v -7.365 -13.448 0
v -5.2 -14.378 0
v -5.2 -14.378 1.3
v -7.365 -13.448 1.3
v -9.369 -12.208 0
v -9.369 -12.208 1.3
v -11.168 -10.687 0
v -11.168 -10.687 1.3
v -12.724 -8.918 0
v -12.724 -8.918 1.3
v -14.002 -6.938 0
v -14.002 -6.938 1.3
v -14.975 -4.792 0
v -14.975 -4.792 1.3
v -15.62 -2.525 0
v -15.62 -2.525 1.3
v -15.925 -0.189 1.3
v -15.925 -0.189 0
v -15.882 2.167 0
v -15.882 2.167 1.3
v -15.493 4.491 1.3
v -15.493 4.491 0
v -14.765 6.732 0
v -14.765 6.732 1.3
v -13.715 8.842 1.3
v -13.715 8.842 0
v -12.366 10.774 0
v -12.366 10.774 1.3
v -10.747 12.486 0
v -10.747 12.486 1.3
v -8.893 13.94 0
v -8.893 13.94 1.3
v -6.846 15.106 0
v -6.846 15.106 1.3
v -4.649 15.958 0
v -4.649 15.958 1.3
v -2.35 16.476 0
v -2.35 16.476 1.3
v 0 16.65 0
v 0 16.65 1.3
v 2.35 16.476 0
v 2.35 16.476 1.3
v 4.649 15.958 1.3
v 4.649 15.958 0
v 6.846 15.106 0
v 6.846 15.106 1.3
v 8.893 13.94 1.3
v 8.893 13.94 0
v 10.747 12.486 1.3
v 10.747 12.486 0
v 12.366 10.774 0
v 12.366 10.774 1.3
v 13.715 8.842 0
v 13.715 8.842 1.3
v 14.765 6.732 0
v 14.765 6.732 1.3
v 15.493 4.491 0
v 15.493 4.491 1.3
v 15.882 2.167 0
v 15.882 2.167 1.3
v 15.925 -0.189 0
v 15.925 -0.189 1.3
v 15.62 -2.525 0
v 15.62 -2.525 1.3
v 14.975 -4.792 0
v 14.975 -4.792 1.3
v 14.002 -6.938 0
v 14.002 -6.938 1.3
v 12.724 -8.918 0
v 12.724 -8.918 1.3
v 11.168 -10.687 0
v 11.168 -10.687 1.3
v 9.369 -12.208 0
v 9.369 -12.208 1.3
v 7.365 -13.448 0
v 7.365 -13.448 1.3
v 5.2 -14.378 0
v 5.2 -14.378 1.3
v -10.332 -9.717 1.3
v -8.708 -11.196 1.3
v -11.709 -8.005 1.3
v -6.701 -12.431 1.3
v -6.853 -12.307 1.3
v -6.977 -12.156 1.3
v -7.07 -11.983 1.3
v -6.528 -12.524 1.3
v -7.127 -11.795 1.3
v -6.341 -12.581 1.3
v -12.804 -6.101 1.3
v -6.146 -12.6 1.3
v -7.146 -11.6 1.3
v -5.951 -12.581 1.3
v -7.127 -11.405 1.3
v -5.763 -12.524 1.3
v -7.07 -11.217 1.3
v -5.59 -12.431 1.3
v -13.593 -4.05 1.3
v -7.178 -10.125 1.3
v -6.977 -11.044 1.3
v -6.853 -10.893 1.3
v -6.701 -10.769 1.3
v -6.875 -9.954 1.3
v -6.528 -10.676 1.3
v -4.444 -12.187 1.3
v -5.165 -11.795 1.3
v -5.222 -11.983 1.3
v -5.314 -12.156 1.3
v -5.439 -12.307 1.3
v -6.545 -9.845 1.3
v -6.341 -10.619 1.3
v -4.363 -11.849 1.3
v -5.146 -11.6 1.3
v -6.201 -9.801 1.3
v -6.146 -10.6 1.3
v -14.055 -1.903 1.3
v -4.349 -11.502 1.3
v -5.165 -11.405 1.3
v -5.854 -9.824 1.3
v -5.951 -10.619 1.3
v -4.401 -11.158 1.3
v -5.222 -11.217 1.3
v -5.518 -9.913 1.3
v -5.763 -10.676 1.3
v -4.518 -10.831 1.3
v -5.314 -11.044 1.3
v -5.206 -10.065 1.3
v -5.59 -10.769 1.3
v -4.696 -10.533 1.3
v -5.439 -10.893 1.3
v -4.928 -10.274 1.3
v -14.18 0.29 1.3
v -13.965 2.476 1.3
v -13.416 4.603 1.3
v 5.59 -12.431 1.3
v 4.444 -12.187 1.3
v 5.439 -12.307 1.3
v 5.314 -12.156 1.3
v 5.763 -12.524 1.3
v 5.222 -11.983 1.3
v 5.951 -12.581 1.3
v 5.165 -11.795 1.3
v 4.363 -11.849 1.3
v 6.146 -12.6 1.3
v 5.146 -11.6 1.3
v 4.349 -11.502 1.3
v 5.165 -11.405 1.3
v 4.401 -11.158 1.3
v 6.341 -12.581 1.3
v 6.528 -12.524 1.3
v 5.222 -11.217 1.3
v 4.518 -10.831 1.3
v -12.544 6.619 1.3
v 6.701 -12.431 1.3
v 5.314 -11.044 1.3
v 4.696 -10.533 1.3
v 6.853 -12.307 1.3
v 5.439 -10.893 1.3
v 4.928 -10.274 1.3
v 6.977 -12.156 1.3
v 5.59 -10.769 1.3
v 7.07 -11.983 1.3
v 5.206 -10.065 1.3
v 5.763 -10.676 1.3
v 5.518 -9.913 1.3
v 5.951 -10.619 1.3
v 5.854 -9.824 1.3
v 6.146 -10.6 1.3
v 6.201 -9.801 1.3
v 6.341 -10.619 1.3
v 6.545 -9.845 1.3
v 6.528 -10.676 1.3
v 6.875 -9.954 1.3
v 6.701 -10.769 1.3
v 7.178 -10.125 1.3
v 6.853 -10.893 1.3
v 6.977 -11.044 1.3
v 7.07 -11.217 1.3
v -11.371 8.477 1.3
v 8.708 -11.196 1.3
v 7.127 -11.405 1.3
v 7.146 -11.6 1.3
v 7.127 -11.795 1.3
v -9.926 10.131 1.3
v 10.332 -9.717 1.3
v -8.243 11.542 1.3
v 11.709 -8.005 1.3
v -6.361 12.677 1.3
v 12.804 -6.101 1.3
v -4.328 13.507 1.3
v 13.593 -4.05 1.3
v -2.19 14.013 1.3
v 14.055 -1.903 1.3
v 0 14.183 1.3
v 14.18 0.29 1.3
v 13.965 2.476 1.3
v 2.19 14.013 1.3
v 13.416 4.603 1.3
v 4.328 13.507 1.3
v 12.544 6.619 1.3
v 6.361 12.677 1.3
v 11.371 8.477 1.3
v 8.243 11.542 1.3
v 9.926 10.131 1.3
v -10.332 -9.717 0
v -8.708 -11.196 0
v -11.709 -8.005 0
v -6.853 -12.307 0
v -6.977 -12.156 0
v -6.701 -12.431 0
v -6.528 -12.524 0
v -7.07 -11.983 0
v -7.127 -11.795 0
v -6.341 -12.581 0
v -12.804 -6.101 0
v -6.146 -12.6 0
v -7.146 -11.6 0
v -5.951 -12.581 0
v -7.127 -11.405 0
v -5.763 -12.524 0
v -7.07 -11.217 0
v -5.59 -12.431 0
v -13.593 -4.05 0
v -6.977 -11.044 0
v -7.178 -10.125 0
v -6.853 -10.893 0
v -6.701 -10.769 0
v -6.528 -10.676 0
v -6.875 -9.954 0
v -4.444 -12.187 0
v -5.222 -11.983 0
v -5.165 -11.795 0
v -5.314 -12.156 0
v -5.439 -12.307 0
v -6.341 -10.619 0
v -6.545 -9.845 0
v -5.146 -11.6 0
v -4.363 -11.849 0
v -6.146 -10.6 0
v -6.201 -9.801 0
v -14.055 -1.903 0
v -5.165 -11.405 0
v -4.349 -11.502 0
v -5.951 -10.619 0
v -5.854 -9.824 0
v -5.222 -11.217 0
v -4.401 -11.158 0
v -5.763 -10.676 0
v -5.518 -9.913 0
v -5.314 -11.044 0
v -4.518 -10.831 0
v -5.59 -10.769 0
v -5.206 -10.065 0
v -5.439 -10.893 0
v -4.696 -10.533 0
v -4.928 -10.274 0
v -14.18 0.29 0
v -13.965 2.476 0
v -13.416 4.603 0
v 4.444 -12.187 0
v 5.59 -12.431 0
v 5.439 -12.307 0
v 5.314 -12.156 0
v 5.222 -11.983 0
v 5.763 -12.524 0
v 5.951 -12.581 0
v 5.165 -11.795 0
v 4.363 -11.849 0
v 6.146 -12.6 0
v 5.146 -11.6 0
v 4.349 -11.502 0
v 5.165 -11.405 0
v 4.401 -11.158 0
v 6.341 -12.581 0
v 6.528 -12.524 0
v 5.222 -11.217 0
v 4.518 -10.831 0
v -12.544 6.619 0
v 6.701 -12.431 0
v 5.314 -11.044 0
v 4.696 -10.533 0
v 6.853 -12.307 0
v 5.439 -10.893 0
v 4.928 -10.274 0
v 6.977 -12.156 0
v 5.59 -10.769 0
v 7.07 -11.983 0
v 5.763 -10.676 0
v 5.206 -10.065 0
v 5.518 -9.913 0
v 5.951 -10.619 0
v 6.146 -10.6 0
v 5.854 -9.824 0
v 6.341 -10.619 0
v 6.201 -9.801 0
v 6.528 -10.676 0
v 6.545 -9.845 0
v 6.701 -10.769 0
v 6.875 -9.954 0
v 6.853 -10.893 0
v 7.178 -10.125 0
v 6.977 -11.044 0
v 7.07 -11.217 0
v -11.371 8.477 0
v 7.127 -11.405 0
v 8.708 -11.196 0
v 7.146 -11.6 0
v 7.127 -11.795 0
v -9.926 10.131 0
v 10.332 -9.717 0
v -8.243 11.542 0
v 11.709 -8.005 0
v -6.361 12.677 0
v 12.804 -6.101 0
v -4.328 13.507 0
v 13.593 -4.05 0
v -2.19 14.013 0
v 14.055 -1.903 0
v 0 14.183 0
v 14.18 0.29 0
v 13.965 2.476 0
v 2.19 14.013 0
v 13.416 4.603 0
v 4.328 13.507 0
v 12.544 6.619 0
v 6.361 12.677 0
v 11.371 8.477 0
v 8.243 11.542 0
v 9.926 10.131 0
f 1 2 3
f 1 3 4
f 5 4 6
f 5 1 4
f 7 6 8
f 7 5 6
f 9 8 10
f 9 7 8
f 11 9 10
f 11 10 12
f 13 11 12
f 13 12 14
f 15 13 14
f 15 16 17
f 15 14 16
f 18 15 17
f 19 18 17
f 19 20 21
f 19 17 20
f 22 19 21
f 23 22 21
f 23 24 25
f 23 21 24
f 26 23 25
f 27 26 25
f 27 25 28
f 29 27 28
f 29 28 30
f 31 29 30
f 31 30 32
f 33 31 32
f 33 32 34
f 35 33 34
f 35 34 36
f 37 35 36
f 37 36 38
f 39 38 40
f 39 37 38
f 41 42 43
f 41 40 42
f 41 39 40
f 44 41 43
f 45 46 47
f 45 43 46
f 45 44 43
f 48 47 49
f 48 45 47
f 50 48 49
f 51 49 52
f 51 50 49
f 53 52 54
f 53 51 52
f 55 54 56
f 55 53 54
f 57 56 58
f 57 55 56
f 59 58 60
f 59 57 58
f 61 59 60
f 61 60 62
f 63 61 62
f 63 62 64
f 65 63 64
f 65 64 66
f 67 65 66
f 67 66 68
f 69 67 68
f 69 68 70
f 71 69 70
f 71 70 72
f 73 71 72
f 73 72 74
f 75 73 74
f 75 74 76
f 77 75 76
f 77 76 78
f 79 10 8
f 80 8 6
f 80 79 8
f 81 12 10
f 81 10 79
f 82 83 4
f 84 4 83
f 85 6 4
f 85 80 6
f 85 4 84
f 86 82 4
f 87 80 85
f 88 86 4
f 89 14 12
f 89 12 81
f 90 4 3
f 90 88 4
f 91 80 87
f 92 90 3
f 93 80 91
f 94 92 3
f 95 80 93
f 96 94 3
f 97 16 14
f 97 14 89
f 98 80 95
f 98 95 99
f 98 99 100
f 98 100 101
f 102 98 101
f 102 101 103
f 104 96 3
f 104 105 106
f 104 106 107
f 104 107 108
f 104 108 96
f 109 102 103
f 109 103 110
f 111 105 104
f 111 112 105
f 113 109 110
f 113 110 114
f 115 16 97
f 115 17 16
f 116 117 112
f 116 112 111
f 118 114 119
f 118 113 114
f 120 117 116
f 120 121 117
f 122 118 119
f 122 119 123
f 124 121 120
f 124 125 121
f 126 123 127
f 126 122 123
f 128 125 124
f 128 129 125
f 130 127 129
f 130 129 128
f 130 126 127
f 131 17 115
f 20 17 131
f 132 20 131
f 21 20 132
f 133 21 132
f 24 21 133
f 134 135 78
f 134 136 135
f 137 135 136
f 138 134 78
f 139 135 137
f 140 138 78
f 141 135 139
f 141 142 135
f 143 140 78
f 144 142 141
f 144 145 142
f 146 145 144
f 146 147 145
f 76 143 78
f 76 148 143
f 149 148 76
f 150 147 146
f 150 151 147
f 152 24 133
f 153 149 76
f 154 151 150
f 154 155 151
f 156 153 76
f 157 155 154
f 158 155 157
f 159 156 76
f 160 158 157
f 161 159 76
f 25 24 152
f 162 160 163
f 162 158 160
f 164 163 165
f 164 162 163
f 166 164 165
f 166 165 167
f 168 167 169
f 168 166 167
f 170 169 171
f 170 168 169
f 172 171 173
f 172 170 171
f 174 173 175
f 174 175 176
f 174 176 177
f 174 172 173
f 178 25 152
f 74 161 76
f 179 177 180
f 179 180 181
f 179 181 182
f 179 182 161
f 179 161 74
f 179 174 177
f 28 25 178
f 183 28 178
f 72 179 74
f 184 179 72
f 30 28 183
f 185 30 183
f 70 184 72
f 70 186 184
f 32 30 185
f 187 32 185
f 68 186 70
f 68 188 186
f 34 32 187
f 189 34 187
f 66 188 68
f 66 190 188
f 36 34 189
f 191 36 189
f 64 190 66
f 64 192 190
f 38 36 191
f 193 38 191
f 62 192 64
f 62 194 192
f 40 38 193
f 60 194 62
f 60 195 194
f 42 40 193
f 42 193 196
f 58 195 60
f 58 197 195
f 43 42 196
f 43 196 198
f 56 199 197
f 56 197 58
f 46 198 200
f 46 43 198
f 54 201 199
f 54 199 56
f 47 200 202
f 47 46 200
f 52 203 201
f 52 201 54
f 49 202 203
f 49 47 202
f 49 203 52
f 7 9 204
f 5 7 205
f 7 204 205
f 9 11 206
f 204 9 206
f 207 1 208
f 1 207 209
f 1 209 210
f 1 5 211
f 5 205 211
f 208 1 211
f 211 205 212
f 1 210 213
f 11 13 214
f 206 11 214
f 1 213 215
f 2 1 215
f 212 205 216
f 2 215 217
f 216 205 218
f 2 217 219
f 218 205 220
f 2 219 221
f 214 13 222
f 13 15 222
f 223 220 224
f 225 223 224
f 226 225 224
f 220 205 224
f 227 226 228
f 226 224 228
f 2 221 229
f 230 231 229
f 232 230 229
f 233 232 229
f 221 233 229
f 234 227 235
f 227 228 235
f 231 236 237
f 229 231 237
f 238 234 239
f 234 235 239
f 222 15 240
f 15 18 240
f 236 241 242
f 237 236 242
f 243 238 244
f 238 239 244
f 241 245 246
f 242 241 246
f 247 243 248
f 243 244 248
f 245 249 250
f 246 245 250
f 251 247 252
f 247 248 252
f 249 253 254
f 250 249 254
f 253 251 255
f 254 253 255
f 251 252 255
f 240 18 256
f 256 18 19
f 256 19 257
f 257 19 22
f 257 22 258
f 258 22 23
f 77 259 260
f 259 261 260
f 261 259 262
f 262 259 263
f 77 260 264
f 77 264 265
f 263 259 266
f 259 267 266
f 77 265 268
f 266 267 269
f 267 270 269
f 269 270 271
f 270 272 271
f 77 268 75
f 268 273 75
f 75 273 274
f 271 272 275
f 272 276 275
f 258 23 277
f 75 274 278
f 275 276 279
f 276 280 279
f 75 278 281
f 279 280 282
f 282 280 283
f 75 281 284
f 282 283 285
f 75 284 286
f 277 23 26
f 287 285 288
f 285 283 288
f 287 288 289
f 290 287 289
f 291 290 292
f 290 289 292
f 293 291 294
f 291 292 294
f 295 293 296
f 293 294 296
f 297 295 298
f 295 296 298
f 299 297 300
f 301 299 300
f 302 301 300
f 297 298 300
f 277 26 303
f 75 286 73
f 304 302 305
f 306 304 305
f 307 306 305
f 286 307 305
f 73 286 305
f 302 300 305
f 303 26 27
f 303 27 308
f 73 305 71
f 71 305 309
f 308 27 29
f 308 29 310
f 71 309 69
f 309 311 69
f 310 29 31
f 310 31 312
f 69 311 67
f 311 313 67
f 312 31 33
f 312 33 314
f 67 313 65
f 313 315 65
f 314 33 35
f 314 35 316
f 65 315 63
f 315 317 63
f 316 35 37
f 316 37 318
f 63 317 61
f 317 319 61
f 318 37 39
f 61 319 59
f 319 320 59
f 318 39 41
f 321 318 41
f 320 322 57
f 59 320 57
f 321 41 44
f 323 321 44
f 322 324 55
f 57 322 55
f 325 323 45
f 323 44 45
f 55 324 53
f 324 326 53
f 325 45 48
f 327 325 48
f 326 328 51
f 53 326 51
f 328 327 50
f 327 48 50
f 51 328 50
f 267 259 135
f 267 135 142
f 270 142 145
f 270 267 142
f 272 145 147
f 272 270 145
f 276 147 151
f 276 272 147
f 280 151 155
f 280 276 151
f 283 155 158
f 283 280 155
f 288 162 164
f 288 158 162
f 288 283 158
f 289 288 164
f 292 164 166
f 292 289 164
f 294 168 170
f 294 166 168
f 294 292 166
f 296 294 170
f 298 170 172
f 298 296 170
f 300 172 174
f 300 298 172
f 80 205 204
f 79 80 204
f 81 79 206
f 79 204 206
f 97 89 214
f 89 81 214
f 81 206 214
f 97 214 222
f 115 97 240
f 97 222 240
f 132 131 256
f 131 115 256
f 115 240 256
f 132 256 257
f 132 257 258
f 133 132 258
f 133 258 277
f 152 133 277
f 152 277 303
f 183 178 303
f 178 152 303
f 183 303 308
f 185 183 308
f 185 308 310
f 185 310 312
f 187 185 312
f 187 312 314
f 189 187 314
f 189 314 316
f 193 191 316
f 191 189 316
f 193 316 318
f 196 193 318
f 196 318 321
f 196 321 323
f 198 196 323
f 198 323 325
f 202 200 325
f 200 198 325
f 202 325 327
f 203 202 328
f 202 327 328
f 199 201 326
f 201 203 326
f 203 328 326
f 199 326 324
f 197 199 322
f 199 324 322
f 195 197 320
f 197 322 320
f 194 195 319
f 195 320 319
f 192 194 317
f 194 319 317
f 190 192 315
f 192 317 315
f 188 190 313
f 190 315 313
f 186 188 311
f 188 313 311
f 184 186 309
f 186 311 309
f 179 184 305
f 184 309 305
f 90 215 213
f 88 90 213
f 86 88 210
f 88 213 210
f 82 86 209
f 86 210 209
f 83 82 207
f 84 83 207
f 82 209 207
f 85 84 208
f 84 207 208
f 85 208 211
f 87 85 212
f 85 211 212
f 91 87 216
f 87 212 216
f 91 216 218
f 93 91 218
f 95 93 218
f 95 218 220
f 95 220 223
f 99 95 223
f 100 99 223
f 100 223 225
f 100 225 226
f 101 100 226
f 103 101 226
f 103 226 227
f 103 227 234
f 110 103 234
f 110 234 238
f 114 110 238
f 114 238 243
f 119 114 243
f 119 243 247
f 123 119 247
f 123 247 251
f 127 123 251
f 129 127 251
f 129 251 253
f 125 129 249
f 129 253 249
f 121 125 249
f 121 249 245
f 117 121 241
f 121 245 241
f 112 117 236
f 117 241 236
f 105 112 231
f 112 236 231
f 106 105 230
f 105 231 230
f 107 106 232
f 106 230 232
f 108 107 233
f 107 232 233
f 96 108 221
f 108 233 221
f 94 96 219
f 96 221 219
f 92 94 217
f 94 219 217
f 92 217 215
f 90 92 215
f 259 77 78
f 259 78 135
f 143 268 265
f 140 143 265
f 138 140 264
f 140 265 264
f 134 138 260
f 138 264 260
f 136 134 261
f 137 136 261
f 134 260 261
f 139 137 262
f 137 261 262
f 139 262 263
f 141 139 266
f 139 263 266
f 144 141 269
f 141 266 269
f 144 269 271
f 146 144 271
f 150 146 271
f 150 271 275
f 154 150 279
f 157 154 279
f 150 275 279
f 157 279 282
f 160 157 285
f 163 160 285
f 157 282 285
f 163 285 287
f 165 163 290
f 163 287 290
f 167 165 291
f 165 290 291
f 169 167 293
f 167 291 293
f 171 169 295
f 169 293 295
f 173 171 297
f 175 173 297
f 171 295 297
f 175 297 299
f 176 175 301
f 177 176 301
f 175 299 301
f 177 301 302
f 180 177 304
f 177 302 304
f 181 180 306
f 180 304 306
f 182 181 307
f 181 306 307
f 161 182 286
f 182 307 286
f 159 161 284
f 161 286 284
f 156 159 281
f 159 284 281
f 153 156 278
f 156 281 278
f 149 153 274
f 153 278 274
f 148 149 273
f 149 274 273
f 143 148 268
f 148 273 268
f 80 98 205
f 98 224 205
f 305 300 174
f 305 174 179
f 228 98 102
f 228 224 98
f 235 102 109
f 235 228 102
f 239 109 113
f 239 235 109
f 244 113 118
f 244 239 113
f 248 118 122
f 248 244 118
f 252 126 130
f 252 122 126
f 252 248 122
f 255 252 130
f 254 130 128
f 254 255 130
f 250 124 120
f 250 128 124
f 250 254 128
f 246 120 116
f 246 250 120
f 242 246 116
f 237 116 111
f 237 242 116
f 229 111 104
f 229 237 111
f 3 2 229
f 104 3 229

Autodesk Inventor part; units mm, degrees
ref_plane "WorkPlane1" through (0, 0, 0) normal (0, 0, 1) x (1, 0, 0)
ref_plane "Work Plane2" through (0, 0, -1.3) normal (0, 0, 1) x (1, 0, 0)
ref_plane "WorkPlane2" through (0, 0, 1) normal (0, 0, 1) x (1, 0, 0)
sketch "Szkic1" plane through (0, 0, 0) normal (0, 0, 1) x (1, 0, 0)
  point P0 (0, 0)
sketch "Szkic2" plane through (0, 0, 0) normal (0, 0, 1) x (1, 0, 0)
  line L0 (5.2, -14.3785) -> (4.4442, -12.1869)
  arc A0 (7.1776, -10.1251) -> (4.4442, -12.1869) centre (6.1458, -11.6) ccw
  line L1 (7.1776, -10.1251) -> (8.7079, -11.1955)
  arc A1 (8.7079, -11.1955) -> (-8.7079, -11.1955) centre (0, 0) ccw
  line L2 (-7.1776, -10.1251) -> (-8.7079, -11.1955)
  arc A2 (-4.4442, -12.1869) -> (-7.1776, -10.1251) centre (-6.1458, -11.6) ccw
  line L3 (-5.2, -14.3785) -> (-4.4442, -12.1869)
  arc A3 (5.2, -14.3785) -> (-5.2, -14.3785) centre (0, 0.7) ccw
  line L4 (0, 0.7) -> (-5.2, -14.3785) construction
  line L5 (0, 0.7) -> (5.2, -14.3785) construction
  dimension "d2" = 15.95
  dimension "d4" = 0
  dimension "d6" = 14.1833
  dimension "d8" = 0.7
  dimension "d10" = 5.2
  dimension "d12" = 5.2
  dimension "d14" = 1.8
  dimension "d16" = 1.8
  dimension "d18" = 13.75
  dimension "d20" = 13.75
  dimension "d22" = 36
  dimension "d24" = 36
extrude "Wyciągnięcie proste1" add sketch "Szkic2" along normal blind 1.3
sketch "Szkic3" plane through (0, 0, 1.3) normal (0, 0, 1) x (1, 0, 0)
  arc A0 (-4.4442, -12.1869) -> (-7.1776, -10.1251) centre (-6.1458, -11.6) ccw projected
hole "Otwór1" at (-6.1458, -11.6, 1.3) direction (0, 0, -1) diameter 2 end through all
sketch "Szkic4" plane through (0, 0, 1.3) normal (0, 0, 1) x (1, 0, 0)
  arc A0 (7.1776, -10.1251) -> (4.4442, -12.1869) centre (6.1458, -11.6) ccw projected
hole "Otwór2" at (6.1458, -11.6, 1.3) direction (0, 0, -1) diameter 2 end through all
equation "\"d2\" = 0.5 * Diam2"
equation "\"d6\" = 0.5 * msp_dd1"
equation "\"d8\" = -0.5 * msp_dd1 + 0.5 * Diam2 - 0.222222 * ParA"
equation "\"d10\" = 2.6 * Diam5"
equation "\"d12\" = 2.6 * Diam5"
equation "\"d14\" = 0.9 * Diam5"
equation "\"d16\" = 0.9 * Diam5"
equation "\"d18\" = 1.3 * Diam5 + 0.5 * Diam2 - ParA"
equation "\"d20\" = 1.3 * Diam5 + 0.5 * Diam2 - ParA"
equation "\"d25\" = ParS"
equation "\"d29\" = Diam5"
equation "\"d36\" = Diam5"
equation "\"Diam5\" = 2"
equation "\"ParA\" = 4.8"
equation "\"ParS\" = 1.3"
equation "\"Diam2\" = 31.9"
equation "\"msp_dd1\" = -b + Diam2 - 0.111111 * ParA"
equation "\"msp_pom\" = 0.5 * Diam2 - b"
equation "\"TEMPLATE\" = 1.2345"
properties part number "ANSI B 27.7M - 3BMI-30" material "Stal, miękka"
